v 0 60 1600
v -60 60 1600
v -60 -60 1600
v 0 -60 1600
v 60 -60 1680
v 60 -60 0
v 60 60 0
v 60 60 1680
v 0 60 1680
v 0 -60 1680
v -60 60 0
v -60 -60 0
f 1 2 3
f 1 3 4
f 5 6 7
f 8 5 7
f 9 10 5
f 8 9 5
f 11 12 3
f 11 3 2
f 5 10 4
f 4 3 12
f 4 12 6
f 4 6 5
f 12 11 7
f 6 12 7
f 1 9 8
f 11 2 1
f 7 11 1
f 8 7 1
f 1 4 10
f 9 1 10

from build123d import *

# Parameters (mm, degrees)
F2_W     = 120
F2_H     = 120
F3_DEPTH = 1680
F4_W     = 60
F4_H     = 80
F5_DEPTH = 120


with BuildPart() as f3:
    # F2 (on Top) → F3 (new body)
    with BuildSketch(Plane.XY):
        Rectangle(F2_W, F2_H)
    extrude(amount=F3_DEPTH)

    # F4 (on face) → F5 (cut, through all)
    with BuildSketch(Plane.XZ.offset(60)):
        with Locations((-30, 1640)):
            Rectangle(F4_W, F4_H)
    extrude(amount=-F5_DEPTH, mode=Mode.SUBTRACT)


solid = f3.part
